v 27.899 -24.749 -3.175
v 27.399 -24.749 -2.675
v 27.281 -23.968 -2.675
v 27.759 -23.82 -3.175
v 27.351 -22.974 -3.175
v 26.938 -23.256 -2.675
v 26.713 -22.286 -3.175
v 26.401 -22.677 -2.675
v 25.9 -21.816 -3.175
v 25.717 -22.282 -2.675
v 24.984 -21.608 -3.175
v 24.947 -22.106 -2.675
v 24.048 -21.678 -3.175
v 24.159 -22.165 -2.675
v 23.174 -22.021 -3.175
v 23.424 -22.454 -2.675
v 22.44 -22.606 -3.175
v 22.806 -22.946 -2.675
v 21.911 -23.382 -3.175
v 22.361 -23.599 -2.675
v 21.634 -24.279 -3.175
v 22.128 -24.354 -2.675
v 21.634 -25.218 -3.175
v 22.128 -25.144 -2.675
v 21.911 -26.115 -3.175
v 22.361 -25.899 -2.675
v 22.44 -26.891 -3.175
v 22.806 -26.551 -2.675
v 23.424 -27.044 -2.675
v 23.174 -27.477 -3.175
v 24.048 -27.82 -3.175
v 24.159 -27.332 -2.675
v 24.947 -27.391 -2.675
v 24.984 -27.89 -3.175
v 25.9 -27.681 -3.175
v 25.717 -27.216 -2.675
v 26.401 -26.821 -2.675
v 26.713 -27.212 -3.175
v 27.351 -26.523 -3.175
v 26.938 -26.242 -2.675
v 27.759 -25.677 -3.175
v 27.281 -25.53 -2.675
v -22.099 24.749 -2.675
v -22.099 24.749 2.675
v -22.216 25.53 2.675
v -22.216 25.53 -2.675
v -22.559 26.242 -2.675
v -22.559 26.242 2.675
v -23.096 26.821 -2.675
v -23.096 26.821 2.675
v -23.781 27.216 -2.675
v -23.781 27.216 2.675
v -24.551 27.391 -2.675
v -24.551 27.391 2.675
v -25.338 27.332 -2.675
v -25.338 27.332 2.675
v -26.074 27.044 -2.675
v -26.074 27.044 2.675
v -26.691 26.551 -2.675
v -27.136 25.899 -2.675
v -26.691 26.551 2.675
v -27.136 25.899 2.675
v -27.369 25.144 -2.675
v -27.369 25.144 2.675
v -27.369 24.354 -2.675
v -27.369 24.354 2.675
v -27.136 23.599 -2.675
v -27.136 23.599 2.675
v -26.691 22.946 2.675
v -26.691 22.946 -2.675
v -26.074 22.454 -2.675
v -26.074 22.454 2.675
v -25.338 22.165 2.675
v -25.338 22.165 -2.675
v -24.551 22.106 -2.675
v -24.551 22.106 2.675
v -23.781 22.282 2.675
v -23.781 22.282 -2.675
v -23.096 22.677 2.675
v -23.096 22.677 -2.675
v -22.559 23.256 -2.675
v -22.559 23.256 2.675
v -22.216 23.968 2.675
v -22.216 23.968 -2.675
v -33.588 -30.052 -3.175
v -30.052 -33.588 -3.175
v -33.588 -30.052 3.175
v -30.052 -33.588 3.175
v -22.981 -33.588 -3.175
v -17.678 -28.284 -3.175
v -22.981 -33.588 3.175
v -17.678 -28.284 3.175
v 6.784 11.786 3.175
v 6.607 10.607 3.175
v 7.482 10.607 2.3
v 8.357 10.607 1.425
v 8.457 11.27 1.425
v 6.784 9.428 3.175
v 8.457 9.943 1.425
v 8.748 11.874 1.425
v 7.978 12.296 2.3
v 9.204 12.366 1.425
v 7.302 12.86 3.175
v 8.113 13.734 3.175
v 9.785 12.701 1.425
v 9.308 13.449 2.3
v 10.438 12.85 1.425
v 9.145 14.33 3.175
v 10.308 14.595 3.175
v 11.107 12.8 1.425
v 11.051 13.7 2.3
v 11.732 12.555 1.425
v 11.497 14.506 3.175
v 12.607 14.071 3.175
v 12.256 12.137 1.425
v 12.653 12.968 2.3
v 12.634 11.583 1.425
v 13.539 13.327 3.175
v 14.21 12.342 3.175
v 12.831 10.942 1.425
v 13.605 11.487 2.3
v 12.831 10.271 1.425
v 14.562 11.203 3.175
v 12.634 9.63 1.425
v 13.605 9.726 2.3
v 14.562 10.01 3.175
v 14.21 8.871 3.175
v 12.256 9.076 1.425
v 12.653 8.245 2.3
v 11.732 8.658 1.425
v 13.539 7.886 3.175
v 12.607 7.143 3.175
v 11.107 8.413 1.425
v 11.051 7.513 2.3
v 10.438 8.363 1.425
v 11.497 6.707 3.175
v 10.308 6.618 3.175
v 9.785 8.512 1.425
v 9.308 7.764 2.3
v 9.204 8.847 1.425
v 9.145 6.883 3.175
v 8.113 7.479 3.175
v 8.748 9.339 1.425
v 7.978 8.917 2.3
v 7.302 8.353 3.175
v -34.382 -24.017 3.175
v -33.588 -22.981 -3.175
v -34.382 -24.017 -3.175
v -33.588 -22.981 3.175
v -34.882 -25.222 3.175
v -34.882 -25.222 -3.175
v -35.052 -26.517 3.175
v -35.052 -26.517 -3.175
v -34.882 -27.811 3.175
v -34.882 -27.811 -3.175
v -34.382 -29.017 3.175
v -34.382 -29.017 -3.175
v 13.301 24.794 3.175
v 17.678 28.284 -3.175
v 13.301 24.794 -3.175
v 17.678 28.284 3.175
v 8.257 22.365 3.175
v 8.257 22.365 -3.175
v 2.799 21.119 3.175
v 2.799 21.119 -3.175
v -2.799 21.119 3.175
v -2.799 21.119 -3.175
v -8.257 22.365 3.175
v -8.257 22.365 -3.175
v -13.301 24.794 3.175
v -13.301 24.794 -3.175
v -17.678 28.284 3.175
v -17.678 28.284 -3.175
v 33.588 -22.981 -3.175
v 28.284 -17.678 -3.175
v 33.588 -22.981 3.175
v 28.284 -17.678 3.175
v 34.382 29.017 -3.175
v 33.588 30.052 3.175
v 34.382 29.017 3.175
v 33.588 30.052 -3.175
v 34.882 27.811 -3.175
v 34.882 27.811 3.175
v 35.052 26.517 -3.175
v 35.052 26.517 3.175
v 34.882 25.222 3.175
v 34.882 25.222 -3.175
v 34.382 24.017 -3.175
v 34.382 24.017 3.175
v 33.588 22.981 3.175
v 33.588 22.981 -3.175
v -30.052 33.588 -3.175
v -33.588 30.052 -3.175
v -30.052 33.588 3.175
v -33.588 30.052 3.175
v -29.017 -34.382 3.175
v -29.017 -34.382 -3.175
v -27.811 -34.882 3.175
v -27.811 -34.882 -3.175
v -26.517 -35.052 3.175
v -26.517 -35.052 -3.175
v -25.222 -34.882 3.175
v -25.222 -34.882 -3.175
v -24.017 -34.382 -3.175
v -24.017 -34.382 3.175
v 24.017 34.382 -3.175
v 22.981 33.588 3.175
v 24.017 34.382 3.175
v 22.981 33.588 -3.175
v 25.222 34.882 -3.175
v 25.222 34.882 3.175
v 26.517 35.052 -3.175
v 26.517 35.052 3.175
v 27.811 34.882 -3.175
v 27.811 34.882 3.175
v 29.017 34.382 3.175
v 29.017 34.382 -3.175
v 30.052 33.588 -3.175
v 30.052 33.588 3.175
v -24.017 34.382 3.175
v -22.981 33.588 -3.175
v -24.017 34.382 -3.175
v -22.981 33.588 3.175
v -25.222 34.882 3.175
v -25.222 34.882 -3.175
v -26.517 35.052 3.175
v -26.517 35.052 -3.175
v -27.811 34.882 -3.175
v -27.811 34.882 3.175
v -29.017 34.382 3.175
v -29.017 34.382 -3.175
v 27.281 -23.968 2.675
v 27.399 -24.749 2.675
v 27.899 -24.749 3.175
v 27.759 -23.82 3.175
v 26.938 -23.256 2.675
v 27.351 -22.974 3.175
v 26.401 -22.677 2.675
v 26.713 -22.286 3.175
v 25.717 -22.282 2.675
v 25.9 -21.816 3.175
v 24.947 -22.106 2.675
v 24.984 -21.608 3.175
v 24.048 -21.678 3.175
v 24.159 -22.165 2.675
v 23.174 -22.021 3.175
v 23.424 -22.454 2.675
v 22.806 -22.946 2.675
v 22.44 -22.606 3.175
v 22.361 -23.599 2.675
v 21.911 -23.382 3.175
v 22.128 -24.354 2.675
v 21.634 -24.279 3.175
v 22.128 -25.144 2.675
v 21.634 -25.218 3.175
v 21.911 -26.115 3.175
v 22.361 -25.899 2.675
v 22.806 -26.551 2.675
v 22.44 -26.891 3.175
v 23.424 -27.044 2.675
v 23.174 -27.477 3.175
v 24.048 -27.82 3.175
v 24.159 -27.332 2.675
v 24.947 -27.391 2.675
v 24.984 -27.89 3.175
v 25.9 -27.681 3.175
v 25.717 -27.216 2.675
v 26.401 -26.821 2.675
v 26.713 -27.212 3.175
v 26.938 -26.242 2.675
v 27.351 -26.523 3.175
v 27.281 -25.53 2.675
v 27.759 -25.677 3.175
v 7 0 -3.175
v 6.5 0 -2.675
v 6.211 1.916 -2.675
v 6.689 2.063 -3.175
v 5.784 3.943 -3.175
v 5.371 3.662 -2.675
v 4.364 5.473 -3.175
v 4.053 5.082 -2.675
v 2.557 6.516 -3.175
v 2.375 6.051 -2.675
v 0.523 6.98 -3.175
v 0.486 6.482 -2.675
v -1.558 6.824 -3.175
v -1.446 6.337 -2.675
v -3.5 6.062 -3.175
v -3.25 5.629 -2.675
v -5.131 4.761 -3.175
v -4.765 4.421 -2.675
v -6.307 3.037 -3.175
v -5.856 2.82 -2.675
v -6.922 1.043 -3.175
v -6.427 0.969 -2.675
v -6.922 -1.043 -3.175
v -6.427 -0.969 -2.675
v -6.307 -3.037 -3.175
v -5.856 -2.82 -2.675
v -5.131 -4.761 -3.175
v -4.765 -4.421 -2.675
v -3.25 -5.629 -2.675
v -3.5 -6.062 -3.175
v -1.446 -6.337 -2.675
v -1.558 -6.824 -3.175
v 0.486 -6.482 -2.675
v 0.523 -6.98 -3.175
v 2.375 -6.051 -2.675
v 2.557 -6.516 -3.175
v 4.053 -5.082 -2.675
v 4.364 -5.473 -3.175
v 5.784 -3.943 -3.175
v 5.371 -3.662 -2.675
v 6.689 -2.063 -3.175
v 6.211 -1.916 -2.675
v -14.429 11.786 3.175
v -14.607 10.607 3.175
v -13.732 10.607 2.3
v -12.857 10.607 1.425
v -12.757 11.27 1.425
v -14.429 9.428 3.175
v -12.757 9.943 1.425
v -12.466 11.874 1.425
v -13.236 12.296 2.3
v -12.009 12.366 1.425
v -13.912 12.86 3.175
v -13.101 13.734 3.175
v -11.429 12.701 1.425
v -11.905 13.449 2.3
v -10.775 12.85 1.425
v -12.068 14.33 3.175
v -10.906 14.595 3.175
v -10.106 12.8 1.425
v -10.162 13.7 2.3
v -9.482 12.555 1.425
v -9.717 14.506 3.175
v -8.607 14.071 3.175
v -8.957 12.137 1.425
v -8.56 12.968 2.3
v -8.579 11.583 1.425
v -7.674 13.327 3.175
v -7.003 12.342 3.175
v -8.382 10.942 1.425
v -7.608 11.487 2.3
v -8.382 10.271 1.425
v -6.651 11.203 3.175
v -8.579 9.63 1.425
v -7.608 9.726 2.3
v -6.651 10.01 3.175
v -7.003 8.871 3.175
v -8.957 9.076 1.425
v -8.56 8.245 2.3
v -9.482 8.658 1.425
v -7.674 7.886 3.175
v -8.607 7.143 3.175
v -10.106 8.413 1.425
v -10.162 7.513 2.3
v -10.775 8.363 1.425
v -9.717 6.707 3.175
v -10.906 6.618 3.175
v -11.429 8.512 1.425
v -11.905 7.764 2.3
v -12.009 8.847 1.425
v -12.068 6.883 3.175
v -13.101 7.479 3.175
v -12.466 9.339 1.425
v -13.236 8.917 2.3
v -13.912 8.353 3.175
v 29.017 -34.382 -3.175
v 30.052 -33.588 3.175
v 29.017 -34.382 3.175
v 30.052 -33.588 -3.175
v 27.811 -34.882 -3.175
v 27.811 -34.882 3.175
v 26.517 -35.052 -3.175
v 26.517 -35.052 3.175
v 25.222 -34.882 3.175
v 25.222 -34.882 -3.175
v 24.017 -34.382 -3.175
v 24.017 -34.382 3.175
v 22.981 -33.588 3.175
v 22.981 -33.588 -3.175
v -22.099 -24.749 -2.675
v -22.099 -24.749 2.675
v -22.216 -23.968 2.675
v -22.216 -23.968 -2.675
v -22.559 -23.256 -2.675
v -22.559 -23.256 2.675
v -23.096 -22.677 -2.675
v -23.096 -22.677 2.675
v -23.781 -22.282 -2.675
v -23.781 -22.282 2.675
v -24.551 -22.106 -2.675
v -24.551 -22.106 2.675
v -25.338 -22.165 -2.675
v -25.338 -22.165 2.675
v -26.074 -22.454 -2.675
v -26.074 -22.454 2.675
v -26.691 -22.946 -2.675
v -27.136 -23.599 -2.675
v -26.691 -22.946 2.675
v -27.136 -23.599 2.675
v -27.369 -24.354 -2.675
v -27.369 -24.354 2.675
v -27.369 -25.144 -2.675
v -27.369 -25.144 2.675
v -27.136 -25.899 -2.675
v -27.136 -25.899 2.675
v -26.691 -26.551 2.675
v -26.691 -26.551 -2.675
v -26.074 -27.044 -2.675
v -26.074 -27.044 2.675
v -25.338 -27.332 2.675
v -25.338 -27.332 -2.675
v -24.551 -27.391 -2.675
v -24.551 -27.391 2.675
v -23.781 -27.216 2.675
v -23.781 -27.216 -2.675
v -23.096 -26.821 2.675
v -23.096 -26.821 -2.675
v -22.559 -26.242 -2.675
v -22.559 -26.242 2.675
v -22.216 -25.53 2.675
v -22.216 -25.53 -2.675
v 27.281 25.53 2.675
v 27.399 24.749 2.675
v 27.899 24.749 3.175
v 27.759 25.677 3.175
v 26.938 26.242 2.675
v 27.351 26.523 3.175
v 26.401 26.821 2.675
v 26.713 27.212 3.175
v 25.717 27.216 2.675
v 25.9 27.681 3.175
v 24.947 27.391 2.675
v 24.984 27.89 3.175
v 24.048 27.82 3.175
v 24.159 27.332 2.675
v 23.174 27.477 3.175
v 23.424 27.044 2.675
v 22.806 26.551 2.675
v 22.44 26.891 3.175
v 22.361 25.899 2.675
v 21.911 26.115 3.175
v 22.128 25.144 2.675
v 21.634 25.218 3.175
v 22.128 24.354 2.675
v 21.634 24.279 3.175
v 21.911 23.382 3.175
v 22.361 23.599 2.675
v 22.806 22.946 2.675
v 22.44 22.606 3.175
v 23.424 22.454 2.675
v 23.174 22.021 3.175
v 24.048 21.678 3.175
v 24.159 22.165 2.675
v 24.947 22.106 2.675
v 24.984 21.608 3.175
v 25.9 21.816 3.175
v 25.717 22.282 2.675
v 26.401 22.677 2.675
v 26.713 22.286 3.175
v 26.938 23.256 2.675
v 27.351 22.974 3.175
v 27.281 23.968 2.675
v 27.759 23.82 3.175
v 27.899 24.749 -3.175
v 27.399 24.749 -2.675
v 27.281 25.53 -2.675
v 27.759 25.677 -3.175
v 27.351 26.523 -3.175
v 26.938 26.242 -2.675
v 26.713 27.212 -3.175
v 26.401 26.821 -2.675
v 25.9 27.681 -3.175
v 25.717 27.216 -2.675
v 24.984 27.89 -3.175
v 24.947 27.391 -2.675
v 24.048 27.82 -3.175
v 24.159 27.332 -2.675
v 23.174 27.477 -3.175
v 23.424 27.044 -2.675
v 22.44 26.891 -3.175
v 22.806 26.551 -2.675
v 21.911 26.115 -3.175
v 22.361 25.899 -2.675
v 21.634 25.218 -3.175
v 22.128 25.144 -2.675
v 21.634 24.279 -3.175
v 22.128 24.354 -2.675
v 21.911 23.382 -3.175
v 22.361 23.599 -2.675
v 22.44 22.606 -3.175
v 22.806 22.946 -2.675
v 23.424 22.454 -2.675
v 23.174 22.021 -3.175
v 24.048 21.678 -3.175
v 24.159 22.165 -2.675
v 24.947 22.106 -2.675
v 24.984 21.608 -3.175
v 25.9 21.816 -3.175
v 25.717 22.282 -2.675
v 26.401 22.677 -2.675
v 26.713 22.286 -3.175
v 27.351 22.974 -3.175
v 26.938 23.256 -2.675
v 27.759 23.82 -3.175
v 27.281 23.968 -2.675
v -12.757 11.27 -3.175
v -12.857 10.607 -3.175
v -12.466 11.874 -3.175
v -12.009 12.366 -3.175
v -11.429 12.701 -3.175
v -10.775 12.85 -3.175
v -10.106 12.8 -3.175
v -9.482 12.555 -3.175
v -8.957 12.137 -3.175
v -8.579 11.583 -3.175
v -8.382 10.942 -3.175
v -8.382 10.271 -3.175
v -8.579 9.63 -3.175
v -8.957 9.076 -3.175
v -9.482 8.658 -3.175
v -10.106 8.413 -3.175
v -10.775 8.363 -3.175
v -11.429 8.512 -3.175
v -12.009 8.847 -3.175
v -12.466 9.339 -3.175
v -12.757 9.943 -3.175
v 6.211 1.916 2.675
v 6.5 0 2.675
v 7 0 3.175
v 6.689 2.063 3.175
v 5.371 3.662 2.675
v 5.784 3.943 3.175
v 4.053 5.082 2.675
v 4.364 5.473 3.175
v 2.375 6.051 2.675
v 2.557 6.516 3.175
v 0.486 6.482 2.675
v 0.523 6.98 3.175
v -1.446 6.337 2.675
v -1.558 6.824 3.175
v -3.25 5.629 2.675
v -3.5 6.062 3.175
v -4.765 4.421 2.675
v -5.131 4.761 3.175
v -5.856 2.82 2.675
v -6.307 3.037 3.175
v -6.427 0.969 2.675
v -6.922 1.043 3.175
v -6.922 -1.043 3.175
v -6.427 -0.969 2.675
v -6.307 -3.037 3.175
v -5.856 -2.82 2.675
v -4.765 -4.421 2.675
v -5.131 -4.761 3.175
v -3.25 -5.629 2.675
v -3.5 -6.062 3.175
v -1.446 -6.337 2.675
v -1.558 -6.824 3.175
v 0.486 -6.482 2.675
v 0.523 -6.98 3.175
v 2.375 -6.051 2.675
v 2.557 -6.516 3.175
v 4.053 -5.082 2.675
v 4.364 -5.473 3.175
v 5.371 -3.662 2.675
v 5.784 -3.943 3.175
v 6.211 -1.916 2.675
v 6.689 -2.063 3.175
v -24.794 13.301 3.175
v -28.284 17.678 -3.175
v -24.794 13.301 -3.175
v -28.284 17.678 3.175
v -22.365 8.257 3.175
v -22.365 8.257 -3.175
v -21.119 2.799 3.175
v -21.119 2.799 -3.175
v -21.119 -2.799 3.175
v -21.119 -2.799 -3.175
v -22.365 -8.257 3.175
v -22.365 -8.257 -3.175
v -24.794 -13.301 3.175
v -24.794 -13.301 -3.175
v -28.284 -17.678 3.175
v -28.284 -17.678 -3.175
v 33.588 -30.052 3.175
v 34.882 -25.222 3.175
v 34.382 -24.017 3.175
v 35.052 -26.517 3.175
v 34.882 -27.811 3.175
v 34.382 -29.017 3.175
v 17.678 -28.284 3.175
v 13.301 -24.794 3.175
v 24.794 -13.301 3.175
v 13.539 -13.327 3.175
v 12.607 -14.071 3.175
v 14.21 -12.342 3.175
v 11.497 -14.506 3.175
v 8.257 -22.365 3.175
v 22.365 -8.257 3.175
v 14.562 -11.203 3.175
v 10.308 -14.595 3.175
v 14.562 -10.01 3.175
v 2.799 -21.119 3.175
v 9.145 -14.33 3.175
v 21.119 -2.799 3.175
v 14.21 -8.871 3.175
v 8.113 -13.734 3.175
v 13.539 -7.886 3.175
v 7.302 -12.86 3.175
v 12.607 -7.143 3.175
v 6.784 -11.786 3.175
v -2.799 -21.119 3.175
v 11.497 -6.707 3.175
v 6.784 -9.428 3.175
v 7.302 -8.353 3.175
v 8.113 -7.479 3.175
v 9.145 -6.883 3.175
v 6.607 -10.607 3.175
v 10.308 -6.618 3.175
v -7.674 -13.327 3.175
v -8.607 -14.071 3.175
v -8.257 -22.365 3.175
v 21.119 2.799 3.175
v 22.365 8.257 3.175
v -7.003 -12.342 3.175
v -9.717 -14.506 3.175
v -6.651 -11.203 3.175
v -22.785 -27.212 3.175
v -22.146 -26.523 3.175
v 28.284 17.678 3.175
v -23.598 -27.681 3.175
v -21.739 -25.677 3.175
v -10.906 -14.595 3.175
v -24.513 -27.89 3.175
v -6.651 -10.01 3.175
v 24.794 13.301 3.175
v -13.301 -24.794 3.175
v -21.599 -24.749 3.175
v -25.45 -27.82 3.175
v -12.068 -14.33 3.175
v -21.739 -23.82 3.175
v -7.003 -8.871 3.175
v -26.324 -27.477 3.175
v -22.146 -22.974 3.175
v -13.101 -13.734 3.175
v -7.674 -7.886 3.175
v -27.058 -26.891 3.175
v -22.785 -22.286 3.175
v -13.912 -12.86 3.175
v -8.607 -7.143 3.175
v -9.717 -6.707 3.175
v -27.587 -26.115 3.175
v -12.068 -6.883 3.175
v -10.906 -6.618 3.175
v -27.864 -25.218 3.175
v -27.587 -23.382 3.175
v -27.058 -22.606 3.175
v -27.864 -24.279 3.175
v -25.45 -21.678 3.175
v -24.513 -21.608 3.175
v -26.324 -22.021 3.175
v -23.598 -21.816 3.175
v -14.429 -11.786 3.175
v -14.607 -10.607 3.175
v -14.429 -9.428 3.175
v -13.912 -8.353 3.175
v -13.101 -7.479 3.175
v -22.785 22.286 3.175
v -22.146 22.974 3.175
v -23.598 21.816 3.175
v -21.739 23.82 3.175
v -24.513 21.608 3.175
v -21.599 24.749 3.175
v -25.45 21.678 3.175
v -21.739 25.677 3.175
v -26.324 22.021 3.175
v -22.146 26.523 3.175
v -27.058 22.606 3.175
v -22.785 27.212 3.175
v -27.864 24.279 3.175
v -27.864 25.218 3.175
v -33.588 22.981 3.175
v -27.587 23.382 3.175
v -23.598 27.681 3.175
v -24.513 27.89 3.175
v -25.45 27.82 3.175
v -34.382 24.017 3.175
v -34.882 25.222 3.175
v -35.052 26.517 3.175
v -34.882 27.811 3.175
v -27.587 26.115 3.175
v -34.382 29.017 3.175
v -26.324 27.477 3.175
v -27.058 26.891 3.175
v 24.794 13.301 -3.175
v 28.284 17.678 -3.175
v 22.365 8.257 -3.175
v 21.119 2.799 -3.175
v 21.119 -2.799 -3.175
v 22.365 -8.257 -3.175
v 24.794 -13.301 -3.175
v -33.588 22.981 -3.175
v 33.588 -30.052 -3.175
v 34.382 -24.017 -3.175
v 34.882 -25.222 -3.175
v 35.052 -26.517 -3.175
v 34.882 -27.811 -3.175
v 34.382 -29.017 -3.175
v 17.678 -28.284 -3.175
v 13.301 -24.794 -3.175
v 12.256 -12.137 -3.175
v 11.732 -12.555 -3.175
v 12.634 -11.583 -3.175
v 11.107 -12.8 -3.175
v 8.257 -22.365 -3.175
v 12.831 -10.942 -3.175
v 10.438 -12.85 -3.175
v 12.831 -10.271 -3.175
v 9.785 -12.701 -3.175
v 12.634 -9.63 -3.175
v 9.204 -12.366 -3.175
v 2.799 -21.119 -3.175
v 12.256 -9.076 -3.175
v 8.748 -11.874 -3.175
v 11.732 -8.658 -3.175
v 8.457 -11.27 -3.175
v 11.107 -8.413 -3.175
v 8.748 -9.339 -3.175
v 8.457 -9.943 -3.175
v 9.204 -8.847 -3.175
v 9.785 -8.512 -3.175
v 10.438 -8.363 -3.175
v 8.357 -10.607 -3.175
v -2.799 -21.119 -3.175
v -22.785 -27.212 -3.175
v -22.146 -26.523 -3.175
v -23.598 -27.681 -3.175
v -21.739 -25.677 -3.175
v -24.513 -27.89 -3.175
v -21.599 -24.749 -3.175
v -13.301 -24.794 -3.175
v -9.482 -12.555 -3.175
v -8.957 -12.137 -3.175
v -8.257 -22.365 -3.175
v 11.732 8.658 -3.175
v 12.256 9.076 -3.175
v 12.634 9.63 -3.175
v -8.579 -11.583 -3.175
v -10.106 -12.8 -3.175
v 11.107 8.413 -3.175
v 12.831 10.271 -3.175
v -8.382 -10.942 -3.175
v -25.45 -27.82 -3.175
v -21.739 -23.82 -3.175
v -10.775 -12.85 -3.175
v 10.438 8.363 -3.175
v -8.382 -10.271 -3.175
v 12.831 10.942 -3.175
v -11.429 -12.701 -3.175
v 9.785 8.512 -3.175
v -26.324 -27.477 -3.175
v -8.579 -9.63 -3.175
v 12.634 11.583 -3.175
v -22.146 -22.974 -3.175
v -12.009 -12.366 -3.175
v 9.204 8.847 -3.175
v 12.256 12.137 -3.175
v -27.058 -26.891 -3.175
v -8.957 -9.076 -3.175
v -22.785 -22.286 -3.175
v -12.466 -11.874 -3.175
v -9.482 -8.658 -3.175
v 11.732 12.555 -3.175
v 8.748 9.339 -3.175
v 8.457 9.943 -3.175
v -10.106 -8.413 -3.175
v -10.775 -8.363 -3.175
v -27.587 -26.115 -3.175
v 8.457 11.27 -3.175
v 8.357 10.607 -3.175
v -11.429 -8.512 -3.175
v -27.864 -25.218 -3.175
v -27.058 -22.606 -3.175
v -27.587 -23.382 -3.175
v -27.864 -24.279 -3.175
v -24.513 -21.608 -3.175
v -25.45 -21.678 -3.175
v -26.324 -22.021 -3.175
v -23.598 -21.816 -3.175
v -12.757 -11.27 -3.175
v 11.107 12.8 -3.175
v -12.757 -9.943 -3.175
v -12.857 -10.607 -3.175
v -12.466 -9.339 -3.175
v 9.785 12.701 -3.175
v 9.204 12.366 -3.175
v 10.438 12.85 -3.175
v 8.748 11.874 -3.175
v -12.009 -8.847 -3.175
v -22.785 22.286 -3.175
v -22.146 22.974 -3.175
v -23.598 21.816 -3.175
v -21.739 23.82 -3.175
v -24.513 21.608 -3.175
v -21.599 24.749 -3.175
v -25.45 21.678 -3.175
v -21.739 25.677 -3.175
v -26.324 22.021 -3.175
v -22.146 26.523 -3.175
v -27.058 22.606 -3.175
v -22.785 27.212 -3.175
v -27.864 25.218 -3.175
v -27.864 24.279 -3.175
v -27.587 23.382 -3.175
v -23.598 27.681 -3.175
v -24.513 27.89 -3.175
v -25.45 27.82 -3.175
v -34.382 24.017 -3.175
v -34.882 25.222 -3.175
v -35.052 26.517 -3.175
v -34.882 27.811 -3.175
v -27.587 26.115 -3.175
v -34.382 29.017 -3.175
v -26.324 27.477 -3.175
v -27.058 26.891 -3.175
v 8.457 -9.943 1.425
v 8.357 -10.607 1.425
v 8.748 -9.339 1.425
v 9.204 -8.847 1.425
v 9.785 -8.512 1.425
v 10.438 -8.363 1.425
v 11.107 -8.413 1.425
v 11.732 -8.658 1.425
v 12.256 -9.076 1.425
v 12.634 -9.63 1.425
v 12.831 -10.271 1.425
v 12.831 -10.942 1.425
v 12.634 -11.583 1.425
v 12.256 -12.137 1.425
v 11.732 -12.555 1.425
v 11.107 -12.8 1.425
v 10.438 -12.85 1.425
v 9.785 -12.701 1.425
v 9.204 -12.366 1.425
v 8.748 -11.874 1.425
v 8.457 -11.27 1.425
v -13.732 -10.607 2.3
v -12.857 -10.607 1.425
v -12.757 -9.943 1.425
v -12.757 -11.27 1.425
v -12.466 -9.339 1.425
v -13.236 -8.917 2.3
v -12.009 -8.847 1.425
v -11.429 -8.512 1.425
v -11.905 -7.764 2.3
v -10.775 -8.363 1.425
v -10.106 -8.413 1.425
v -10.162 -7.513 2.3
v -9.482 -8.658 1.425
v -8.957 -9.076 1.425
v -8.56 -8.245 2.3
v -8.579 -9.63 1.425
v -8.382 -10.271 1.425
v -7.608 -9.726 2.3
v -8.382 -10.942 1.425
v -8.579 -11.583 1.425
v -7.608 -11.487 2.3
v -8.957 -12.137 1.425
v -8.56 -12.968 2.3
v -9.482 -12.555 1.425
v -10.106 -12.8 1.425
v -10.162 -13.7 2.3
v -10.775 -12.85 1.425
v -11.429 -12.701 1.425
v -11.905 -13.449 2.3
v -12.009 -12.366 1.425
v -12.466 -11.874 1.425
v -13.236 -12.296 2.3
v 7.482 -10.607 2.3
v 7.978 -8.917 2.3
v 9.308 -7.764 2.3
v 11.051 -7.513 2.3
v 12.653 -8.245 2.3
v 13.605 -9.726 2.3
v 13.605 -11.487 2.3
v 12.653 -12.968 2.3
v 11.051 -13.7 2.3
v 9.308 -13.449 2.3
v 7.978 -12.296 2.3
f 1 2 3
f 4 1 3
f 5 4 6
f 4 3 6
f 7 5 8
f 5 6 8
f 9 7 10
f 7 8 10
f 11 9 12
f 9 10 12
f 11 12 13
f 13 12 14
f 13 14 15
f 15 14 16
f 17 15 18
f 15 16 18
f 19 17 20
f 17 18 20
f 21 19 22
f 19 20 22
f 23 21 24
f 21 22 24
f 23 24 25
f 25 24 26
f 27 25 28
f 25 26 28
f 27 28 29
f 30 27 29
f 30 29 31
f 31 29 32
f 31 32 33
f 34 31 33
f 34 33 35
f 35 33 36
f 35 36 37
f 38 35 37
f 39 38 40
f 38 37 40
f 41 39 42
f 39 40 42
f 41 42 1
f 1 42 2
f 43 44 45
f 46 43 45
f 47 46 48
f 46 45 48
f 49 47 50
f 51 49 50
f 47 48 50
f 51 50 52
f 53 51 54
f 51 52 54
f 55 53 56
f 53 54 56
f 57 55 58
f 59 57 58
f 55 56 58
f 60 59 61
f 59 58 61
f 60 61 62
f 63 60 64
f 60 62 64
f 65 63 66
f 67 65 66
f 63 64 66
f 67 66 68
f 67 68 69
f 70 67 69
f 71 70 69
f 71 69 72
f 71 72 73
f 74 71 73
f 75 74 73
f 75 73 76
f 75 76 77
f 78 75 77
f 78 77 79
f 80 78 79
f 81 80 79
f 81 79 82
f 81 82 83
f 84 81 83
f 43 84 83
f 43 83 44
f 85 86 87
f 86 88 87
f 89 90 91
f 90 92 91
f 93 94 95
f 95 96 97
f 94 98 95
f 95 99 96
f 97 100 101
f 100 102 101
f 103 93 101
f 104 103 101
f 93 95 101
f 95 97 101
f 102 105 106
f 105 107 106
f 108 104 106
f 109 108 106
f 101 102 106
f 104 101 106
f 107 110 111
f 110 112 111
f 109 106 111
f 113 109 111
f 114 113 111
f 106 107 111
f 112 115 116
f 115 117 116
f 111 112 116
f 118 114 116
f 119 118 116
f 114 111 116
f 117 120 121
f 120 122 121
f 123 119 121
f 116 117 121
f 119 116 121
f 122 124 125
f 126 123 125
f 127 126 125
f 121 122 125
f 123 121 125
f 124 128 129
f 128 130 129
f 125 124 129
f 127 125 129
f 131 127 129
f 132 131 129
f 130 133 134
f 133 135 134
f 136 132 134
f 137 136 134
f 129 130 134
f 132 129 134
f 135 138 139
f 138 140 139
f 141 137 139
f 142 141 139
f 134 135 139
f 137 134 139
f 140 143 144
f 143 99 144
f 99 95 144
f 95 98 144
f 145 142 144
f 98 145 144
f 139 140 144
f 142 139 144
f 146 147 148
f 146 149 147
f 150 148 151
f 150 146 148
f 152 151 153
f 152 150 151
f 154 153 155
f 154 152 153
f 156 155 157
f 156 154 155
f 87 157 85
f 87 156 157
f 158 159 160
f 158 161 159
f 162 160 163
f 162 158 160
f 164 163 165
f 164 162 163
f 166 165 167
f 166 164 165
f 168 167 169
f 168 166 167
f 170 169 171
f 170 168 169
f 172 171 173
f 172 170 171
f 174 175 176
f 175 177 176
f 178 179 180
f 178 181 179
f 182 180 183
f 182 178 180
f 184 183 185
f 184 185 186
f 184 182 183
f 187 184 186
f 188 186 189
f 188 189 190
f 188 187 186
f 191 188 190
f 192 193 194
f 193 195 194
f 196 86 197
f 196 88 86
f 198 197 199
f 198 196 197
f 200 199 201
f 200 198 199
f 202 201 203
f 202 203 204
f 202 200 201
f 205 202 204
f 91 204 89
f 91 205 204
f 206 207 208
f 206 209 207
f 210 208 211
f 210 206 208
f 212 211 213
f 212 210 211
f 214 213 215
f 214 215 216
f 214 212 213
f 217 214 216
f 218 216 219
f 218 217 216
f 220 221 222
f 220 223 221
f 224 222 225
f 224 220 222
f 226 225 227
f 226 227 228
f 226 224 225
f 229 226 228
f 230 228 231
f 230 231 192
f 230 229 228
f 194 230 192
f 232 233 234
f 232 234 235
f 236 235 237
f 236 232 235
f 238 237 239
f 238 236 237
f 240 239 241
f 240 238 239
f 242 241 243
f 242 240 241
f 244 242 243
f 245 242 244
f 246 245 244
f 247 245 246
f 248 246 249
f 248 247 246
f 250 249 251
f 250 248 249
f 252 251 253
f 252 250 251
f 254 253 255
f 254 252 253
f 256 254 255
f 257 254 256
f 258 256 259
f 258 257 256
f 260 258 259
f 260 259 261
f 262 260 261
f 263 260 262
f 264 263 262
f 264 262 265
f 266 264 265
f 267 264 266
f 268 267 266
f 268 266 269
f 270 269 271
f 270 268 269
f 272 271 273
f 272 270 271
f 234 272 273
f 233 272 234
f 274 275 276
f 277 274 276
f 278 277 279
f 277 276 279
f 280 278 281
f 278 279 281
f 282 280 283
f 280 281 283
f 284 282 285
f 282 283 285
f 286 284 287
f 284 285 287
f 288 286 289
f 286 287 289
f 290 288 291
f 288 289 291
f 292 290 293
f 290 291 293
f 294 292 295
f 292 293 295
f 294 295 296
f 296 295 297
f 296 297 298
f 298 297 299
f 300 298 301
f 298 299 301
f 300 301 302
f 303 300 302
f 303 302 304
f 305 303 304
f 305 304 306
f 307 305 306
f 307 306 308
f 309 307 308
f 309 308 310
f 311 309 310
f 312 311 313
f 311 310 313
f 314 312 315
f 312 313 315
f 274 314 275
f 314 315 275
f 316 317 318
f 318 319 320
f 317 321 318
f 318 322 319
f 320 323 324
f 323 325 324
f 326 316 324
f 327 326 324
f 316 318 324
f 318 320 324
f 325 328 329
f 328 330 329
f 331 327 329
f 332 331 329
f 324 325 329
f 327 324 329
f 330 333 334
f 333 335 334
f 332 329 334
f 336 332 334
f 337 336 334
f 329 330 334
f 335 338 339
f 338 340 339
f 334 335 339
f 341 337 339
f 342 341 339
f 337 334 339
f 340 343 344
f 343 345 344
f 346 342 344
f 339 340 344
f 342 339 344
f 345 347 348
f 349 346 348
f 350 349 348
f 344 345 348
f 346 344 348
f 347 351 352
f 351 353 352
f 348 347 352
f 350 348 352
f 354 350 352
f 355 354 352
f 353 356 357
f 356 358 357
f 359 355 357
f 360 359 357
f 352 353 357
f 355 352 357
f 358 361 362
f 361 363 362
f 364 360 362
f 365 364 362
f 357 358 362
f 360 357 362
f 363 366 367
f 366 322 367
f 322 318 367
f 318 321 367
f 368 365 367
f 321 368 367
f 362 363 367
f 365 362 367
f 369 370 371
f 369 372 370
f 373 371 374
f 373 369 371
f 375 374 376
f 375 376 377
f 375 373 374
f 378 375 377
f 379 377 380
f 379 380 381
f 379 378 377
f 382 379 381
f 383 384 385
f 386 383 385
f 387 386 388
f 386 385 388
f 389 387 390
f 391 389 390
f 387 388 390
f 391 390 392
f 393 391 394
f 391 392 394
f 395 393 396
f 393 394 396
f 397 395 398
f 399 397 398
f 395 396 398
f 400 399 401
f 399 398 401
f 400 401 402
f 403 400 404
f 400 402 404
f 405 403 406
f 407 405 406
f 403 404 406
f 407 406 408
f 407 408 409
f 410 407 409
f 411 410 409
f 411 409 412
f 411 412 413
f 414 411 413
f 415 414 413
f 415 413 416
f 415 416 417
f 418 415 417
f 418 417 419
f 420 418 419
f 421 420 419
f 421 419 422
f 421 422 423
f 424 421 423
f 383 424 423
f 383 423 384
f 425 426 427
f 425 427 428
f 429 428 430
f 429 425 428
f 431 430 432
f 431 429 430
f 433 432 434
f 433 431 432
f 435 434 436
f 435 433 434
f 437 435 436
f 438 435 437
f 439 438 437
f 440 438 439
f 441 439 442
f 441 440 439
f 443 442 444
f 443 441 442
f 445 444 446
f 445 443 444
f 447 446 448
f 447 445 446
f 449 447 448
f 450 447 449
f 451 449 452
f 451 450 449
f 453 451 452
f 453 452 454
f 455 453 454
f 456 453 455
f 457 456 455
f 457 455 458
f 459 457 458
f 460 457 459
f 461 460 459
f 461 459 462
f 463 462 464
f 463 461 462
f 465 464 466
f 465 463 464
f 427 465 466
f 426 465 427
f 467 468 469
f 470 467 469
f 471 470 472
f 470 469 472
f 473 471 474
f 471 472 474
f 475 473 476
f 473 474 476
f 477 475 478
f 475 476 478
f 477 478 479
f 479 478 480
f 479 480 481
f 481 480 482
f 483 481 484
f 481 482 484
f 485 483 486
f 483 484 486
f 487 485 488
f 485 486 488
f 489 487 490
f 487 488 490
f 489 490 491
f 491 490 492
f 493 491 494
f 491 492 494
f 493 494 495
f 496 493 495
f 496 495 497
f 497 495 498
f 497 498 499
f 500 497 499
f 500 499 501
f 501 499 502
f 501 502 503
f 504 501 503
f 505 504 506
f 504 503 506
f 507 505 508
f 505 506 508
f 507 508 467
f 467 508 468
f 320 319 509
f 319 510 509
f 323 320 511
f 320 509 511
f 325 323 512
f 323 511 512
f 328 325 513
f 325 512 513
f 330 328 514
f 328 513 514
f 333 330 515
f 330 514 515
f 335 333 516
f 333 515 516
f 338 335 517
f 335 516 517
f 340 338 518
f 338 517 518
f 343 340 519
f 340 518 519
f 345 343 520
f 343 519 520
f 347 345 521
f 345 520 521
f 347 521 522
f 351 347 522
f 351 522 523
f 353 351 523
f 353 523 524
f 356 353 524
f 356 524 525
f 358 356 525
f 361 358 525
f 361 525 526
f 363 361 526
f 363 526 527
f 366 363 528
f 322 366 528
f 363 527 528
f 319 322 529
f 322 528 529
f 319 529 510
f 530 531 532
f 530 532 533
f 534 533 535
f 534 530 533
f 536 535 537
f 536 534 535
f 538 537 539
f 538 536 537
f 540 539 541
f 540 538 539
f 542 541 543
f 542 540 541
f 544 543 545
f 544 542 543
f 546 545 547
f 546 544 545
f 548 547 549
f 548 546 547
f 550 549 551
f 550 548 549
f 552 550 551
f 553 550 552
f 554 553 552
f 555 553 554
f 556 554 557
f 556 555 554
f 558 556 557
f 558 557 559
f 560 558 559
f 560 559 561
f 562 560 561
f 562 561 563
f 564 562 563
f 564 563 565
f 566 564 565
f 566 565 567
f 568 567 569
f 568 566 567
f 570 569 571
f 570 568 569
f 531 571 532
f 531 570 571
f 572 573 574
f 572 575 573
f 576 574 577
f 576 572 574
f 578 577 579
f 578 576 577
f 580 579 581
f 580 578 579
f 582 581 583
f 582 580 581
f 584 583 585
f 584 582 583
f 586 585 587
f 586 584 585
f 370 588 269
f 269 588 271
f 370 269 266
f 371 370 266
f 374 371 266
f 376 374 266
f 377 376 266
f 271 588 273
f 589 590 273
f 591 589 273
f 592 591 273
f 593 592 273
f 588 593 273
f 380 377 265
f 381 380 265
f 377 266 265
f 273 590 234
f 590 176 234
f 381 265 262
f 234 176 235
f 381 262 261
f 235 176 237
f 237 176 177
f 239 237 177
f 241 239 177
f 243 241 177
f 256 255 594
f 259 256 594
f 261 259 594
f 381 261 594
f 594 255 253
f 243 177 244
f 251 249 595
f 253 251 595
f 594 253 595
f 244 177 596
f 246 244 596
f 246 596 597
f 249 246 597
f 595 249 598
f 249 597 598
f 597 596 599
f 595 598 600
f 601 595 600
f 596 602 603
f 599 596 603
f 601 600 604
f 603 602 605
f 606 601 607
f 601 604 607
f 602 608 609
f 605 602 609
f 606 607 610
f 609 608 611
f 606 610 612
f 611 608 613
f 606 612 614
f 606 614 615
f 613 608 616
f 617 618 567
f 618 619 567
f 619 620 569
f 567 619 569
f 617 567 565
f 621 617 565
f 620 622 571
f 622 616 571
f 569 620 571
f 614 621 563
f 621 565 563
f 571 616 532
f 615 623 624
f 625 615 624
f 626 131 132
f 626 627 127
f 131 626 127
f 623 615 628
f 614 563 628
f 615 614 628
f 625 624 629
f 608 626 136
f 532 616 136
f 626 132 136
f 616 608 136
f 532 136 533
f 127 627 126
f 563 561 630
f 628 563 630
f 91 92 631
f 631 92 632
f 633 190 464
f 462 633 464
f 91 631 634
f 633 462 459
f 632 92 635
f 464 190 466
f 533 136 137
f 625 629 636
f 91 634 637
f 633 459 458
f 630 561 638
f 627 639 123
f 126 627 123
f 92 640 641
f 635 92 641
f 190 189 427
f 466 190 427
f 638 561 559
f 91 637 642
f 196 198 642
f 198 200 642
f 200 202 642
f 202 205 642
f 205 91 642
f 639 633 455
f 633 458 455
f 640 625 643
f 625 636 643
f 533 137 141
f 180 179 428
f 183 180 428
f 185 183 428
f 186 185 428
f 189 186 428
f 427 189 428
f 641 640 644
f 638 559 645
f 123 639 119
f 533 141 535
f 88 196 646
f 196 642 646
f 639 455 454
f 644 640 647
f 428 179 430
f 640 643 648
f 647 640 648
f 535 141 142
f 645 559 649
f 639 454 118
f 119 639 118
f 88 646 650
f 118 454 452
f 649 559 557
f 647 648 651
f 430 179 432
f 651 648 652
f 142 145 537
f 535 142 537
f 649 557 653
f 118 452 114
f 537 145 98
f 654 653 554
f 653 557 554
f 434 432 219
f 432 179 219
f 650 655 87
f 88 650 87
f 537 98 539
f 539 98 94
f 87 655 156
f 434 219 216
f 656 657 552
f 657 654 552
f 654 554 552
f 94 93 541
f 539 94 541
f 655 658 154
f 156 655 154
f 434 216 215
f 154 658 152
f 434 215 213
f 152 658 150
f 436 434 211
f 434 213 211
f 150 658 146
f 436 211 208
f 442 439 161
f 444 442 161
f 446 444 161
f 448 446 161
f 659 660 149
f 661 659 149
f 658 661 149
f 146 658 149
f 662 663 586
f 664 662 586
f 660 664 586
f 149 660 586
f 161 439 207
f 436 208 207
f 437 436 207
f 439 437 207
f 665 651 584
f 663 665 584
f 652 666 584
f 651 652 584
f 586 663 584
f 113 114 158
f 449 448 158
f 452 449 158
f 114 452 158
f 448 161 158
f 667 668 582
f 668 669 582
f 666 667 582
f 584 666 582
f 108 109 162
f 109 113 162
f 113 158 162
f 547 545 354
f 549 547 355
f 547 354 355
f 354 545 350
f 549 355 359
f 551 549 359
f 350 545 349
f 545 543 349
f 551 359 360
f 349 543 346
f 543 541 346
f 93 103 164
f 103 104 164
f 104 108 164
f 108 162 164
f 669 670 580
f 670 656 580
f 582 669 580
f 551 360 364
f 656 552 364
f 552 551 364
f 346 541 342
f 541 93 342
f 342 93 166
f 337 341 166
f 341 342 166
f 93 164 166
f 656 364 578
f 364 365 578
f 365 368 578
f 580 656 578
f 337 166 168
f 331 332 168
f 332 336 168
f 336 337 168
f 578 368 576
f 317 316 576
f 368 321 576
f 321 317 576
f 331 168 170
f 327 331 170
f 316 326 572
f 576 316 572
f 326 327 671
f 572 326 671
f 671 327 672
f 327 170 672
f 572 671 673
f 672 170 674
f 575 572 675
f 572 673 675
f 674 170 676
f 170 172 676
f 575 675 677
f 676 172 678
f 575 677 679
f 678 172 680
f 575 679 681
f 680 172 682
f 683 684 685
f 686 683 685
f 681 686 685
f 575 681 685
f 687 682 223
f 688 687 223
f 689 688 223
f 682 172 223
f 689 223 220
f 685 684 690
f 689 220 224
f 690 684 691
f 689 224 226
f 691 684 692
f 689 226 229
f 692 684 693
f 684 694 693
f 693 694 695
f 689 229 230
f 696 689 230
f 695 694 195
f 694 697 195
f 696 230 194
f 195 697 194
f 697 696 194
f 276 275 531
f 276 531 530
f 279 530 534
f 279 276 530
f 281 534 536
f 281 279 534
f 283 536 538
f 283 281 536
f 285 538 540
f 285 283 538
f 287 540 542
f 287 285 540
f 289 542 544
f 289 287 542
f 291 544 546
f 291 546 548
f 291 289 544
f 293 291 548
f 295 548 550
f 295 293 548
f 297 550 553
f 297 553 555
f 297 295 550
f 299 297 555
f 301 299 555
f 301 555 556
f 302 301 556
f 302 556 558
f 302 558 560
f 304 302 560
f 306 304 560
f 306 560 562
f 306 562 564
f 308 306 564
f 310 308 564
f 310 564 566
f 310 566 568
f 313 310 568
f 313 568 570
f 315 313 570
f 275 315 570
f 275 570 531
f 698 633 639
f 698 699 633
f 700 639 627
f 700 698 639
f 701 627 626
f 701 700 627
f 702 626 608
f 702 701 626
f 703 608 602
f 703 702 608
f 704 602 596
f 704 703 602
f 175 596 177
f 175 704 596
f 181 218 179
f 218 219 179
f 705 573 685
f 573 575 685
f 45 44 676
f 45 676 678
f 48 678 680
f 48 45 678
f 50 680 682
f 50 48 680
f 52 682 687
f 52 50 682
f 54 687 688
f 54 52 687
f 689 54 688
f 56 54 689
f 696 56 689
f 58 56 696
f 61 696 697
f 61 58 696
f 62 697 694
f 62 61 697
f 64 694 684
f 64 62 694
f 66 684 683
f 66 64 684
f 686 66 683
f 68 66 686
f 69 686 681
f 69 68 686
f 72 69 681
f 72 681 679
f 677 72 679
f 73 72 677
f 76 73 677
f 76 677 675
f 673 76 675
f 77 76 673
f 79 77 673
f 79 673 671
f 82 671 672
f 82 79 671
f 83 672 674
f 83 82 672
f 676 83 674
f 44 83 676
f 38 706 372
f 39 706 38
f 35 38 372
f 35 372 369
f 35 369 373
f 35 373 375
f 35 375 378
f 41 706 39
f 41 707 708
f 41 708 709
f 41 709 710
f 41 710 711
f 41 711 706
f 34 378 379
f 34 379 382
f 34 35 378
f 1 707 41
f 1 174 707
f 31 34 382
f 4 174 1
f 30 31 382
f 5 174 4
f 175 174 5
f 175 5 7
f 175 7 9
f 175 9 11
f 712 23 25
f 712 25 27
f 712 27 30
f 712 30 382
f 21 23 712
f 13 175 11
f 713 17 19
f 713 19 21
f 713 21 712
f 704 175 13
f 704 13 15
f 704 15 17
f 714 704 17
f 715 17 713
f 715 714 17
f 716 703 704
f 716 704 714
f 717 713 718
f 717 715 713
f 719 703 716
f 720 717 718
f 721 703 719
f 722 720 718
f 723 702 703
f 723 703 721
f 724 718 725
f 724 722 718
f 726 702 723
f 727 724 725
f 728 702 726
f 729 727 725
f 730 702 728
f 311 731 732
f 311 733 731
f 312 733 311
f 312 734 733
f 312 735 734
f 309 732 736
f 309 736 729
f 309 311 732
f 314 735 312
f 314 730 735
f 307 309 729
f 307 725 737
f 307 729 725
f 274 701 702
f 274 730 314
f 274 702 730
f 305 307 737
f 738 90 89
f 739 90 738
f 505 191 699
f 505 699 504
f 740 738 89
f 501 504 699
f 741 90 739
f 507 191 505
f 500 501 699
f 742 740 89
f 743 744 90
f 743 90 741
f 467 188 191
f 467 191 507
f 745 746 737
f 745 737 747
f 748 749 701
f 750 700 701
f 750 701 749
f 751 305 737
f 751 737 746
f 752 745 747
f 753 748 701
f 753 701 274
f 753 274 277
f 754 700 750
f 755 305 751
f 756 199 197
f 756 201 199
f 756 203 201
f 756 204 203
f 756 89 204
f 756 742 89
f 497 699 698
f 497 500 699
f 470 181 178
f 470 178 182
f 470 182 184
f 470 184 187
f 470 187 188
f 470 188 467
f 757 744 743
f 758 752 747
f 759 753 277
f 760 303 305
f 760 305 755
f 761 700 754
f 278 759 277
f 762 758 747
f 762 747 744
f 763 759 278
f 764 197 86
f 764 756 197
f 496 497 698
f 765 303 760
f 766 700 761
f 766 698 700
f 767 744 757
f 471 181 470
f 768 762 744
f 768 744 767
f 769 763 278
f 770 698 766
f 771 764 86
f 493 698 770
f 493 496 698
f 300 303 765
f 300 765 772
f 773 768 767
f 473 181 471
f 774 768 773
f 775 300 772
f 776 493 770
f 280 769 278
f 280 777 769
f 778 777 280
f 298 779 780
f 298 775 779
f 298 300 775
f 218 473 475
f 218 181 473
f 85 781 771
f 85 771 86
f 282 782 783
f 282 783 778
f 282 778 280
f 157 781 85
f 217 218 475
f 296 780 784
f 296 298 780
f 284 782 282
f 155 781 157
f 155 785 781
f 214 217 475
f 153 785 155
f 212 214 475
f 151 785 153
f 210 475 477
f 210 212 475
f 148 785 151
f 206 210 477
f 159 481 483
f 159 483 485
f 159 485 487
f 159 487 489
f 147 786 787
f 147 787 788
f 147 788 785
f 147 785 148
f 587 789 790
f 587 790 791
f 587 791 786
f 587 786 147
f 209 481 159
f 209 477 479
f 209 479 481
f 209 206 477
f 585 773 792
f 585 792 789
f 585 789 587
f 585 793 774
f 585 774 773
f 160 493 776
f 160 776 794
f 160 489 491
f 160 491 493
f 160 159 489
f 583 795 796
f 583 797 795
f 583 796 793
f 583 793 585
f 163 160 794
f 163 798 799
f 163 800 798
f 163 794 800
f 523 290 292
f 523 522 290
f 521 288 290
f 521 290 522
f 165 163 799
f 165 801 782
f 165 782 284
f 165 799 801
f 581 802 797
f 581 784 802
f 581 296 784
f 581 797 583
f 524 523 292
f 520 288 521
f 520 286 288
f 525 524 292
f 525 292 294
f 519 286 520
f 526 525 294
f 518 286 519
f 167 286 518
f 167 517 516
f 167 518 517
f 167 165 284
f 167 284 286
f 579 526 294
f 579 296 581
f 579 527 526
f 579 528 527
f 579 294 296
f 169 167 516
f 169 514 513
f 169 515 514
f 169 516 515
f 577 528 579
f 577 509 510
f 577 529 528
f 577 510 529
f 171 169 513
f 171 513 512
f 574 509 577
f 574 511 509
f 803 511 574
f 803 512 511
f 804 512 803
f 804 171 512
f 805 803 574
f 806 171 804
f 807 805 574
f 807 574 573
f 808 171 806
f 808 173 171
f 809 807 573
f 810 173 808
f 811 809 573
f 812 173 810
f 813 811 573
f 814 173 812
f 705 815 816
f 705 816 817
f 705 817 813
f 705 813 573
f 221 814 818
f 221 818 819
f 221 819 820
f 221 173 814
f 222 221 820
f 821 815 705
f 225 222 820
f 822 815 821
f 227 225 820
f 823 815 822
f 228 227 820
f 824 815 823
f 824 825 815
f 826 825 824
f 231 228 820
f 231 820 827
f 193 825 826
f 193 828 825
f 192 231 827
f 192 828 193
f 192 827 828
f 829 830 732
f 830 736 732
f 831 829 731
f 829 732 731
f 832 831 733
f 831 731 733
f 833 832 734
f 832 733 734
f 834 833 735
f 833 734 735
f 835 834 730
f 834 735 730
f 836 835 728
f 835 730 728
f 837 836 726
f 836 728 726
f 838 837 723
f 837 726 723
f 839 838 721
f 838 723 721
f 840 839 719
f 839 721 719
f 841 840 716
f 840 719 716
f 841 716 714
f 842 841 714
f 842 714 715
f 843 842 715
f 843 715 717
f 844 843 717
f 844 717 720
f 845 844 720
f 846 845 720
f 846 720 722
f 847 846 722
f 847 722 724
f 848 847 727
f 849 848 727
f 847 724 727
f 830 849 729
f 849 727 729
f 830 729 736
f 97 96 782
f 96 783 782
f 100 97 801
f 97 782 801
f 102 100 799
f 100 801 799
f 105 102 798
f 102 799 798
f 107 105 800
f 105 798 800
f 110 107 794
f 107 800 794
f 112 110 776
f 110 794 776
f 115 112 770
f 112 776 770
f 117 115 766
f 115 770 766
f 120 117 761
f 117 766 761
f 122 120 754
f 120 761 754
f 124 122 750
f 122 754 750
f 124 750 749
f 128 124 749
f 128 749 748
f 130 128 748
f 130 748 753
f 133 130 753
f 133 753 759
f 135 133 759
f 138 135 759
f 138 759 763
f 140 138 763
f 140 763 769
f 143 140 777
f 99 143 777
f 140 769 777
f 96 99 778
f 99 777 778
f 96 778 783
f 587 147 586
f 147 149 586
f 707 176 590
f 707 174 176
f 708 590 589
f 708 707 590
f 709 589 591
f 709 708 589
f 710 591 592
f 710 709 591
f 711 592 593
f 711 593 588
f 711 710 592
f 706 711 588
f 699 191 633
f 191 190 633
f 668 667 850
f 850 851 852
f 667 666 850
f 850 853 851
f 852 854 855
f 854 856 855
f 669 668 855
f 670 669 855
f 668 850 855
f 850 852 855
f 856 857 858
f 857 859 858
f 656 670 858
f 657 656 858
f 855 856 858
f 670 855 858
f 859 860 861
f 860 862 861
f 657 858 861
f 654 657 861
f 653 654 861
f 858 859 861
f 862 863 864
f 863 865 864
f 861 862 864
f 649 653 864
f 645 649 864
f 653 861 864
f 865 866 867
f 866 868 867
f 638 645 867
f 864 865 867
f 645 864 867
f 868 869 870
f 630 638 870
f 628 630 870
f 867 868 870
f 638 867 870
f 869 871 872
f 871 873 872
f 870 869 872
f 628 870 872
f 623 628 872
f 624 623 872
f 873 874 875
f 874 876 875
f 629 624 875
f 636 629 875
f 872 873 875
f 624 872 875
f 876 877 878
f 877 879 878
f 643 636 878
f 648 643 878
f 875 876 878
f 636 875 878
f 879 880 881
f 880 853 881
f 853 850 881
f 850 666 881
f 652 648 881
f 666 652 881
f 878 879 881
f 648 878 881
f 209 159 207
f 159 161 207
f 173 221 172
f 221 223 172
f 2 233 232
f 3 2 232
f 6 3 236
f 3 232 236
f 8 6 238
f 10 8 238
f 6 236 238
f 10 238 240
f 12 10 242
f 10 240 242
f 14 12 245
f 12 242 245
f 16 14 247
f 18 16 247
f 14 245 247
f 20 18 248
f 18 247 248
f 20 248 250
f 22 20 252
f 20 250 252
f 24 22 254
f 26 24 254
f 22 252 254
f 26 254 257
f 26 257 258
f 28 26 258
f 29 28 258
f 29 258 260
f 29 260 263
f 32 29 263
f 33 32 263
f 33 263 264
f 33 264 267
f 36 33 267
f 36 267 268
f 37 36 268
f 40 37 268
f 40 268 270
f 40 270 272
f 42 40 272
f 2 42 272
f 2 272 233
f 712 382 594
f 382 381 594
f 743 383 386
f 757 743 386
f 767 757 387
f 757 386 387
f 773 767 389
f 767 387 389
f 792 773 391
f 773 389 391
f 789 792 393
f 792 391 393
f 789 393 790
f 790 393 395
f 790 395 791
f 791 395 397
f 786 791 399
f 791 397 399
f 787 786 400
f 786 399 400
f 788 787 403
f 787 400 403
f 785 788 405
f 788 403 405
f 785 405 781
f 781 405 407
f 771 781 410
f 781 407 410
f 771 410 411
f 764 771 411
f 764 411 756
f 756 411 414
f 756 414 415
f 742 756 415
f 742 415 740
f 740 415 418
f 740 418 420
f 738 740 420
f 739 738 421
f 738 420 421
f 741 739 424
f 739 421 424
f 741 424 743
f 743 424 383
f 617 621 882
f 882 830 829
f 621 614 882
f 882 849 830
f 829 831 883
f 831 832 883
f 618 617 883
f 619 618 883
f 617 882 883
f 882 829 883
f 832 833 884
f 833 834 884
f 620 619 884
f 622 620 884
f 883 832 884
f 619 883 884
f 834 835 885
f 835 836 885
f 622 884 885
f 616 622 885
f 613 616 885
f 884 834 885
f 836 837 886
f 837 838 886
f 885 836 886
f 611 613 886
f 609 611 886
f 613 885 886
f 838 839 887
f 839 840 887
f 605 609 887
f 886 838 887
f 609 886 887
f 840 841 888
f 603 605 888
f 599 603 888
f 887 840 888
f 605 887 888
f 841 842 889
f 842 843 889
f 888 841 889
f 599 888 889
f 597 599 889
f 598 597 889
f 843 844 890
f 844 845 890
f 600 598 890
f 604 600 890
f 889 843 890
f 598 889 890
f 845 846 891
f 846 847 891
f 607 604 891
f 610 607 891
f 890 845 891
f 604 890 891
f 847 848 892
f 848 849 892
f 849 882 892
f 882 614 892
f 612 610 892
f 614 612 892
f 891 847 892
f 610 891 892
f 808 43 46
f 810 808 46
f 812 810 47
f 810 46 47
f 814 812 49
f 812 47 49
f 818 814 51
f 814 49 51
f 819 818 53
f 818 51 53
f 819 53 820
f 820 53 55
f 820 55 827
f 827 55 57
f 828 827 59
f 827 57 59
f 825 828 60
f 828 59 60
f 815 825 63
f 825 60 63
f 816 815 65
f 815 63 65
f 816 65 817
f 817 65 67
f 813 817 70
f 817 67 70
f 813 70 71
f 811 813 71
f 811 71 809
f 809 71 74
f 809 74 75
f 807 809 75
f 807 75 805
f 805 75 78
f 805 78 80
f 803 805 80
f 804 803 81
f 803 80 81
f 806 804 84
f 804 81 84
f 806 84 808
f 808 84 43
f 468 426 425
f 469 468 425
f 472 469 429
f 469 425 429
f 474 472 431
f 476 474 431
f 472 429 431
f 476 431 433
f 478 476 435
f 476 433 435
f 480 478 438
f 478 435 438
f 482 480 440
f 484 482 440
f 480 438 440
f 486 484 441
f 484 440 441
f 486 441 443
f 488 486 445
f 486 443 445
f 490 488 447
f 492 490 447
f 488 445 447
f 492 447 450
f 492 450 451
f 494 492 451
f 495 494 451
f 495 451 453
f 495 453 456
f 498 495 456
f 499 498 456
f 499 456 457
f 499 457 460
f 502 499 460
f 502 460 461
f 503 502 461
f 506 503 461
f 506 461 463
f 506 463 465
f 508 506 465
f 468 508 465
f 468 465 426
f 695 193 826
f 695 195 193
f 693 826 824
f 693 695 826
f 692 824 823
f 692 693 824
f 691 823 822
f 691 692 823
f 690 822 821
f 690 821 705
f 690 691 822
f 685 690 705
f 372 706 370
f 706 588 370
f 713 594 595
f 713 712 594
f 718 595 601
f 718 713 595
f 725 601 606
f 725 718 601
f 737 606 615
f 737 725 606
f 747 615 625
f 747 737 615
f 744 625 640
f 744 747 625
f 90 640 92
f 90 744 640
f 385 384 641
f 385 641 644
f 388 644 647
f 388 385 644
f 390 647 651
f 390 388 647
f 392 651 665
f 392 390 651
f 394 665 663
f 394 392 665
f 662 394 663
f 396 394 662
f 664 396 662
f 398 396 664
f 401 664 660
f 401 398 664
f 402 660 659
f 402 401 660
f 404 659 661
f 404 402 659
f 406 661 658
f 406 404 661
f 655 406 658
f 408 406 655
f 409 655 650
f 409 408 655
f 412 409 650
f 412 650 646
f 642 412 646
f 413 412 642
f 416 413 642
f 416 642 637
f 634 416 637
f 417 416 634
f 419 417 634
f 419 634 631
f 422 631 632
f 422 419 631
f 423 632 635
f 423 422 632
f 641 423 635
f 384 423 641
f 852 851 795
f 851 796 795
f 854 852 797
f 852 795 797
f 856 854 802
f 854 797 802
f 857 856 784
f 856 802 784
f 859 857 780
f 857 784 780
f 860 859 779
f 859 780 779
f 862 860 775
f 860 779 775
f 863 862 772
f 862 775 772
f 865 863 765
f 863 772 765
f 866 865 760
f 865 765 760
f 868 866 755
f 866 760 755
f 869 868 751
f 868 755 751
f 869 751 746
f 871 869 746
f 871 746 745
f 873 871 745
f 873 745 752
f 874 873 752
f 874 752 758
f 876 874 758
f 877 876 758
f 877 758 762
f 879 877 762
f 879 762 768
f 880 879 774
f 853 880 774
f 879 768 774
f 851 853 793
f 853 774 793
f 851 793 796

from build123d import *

# Parameters (mm, degrees)
SKETCH1_R                      = 6.5
F_1_4_IN_SHEET_METAL_DEPTH     = 3.175
M4_CLEARANCE_HOLE1_D           = 4.5
M4_CLEARANCE_HOLE1_CSINK_D     = 8
M4_CLEARANCE_HOLE1_CSINK_ANGLE = 90
M5_CLEARANCE_HOLE1_D           = 5.3
F_25_MM_FILLET_R               = 25
F_5_MM_FILLET_R                = 5
F_0_50_MM_CHAMFER_SIZE         = 0.5


with BuildPart() as part:
    # Sketch1 → 1/4 in Sheet Metal (new, symmetric)
    with BuildSketch(Plane.XY):
        Polygon((0, 10.606601718), (26.516504294, 37.123106012), (37.123106012, 26.516504294), (10.606601718, 0), (37.123106012, -26.516504294), (26.516504294, -37.123106012), (0, -10.606601718), (-26.516504294, -37.123106012), (-37.123106012, -26.516504294), (-10.606601718, 0), (-37.123106012, 26.516504294), (-26.516504294, 37.123106012), align=None)
        Circle(SKETCH1_R, mode=Mode.SUBTRACT)
    extrude(amount=F_1_4_IN_SHEET_METAL_DEPTH, both=True)

    # M4 Clearance Hole1 (through all)
    with Locations(Plane.XY.offset(3.175)):
        with Locations((-10.606601718, 10.606601718), (10.606601718, 10.606601718), (10.606601718, -10.606601718), (-10.606601718, -10.606601718)):
            CounterSinkHole(M4_CLEARANCE_HOLE1_D / 2, M4_CLEARANCE_HOLE1_CSINK_D / 2, counter_sink_angle=M4_CLEARANCE_HOLE1_CSINK_ANGLE)

    # M5 Clearance Hole1 (through all)
    with Locations(Plane(origin=(0, 0, -3.175), x_dir=(-1, 0, 0), z_dir=(0, 0, -1))):
        with Locations((-24.748737342, 24.748737342), (24.748737342, 24.748737342), (24.748737342, -24.748737342), (-24.748737342, -24.748737342)):
            Hole(M5_CLEARANCE_HOLE1_D / 2)

    # 25 mm Fillet
    f_25_mm_fillet_edges = [part.edges().sort_by_distance(p)[0] for p in [
        (0, 10.606601718, 0),
        (10.606601718, 0, 0),
        (0, -10.606601718, 0),
        (-10.606601718, 0, 0),
    ]]
    fillet(f_25_mm_fillet_edges, radius=F_25_MM_FILLET_R)

    # 5 mm Fillet
    f_5_mm_fillet_edges = [part.edges().sort_by_distance(p)[0] for p in [
        (26.516504294, 37.123106012, 0),
        (37.123106012, 26.516504294, 0),
        (37.123106012, -26.516504294, 0),
        (26.516504294, -37.123106012, 0),
        (-26.516504294, -37.123106012, 0),
        (-37.123106012, -26.516504294, 0),
        (-37.123106012, 26.516504294, 0),
        (-26.516504294, 37.123106012, 0),
    ]]
    fillet(f_5_mm_fillet_edges, radius=F_5_MM_FILLET_R)

    # 0.50 mm Chamfer
    f_0_50_mm_chamfer_edges = [part.edges().sort_by_distance(p)[0] for p in [
        (-6.5, 0, -3.175),
        (-6.5, 0, 3.175),
        (22.098737342, -24.748737342, -3.175),
        (22.098737342, -24.748737342, 3.175),
        (-27.398737342, -24.748737342, -3.175),
        (-27.398737342, -24.748737342, 3.175),
        (-27.398737342, 24.748737342, -3.175),
        (-27.398737342, 24.748737342, 3.175),
        (22.098737342, 24.748737342, -3.175),
        (22.098737342, 24.748737342, 3.175),
    ]]
    chamfer(f_0_50_mm_chamfer_edges, length=F_0_50_MM_CHAMFER_SIZE)


solid = part.part
